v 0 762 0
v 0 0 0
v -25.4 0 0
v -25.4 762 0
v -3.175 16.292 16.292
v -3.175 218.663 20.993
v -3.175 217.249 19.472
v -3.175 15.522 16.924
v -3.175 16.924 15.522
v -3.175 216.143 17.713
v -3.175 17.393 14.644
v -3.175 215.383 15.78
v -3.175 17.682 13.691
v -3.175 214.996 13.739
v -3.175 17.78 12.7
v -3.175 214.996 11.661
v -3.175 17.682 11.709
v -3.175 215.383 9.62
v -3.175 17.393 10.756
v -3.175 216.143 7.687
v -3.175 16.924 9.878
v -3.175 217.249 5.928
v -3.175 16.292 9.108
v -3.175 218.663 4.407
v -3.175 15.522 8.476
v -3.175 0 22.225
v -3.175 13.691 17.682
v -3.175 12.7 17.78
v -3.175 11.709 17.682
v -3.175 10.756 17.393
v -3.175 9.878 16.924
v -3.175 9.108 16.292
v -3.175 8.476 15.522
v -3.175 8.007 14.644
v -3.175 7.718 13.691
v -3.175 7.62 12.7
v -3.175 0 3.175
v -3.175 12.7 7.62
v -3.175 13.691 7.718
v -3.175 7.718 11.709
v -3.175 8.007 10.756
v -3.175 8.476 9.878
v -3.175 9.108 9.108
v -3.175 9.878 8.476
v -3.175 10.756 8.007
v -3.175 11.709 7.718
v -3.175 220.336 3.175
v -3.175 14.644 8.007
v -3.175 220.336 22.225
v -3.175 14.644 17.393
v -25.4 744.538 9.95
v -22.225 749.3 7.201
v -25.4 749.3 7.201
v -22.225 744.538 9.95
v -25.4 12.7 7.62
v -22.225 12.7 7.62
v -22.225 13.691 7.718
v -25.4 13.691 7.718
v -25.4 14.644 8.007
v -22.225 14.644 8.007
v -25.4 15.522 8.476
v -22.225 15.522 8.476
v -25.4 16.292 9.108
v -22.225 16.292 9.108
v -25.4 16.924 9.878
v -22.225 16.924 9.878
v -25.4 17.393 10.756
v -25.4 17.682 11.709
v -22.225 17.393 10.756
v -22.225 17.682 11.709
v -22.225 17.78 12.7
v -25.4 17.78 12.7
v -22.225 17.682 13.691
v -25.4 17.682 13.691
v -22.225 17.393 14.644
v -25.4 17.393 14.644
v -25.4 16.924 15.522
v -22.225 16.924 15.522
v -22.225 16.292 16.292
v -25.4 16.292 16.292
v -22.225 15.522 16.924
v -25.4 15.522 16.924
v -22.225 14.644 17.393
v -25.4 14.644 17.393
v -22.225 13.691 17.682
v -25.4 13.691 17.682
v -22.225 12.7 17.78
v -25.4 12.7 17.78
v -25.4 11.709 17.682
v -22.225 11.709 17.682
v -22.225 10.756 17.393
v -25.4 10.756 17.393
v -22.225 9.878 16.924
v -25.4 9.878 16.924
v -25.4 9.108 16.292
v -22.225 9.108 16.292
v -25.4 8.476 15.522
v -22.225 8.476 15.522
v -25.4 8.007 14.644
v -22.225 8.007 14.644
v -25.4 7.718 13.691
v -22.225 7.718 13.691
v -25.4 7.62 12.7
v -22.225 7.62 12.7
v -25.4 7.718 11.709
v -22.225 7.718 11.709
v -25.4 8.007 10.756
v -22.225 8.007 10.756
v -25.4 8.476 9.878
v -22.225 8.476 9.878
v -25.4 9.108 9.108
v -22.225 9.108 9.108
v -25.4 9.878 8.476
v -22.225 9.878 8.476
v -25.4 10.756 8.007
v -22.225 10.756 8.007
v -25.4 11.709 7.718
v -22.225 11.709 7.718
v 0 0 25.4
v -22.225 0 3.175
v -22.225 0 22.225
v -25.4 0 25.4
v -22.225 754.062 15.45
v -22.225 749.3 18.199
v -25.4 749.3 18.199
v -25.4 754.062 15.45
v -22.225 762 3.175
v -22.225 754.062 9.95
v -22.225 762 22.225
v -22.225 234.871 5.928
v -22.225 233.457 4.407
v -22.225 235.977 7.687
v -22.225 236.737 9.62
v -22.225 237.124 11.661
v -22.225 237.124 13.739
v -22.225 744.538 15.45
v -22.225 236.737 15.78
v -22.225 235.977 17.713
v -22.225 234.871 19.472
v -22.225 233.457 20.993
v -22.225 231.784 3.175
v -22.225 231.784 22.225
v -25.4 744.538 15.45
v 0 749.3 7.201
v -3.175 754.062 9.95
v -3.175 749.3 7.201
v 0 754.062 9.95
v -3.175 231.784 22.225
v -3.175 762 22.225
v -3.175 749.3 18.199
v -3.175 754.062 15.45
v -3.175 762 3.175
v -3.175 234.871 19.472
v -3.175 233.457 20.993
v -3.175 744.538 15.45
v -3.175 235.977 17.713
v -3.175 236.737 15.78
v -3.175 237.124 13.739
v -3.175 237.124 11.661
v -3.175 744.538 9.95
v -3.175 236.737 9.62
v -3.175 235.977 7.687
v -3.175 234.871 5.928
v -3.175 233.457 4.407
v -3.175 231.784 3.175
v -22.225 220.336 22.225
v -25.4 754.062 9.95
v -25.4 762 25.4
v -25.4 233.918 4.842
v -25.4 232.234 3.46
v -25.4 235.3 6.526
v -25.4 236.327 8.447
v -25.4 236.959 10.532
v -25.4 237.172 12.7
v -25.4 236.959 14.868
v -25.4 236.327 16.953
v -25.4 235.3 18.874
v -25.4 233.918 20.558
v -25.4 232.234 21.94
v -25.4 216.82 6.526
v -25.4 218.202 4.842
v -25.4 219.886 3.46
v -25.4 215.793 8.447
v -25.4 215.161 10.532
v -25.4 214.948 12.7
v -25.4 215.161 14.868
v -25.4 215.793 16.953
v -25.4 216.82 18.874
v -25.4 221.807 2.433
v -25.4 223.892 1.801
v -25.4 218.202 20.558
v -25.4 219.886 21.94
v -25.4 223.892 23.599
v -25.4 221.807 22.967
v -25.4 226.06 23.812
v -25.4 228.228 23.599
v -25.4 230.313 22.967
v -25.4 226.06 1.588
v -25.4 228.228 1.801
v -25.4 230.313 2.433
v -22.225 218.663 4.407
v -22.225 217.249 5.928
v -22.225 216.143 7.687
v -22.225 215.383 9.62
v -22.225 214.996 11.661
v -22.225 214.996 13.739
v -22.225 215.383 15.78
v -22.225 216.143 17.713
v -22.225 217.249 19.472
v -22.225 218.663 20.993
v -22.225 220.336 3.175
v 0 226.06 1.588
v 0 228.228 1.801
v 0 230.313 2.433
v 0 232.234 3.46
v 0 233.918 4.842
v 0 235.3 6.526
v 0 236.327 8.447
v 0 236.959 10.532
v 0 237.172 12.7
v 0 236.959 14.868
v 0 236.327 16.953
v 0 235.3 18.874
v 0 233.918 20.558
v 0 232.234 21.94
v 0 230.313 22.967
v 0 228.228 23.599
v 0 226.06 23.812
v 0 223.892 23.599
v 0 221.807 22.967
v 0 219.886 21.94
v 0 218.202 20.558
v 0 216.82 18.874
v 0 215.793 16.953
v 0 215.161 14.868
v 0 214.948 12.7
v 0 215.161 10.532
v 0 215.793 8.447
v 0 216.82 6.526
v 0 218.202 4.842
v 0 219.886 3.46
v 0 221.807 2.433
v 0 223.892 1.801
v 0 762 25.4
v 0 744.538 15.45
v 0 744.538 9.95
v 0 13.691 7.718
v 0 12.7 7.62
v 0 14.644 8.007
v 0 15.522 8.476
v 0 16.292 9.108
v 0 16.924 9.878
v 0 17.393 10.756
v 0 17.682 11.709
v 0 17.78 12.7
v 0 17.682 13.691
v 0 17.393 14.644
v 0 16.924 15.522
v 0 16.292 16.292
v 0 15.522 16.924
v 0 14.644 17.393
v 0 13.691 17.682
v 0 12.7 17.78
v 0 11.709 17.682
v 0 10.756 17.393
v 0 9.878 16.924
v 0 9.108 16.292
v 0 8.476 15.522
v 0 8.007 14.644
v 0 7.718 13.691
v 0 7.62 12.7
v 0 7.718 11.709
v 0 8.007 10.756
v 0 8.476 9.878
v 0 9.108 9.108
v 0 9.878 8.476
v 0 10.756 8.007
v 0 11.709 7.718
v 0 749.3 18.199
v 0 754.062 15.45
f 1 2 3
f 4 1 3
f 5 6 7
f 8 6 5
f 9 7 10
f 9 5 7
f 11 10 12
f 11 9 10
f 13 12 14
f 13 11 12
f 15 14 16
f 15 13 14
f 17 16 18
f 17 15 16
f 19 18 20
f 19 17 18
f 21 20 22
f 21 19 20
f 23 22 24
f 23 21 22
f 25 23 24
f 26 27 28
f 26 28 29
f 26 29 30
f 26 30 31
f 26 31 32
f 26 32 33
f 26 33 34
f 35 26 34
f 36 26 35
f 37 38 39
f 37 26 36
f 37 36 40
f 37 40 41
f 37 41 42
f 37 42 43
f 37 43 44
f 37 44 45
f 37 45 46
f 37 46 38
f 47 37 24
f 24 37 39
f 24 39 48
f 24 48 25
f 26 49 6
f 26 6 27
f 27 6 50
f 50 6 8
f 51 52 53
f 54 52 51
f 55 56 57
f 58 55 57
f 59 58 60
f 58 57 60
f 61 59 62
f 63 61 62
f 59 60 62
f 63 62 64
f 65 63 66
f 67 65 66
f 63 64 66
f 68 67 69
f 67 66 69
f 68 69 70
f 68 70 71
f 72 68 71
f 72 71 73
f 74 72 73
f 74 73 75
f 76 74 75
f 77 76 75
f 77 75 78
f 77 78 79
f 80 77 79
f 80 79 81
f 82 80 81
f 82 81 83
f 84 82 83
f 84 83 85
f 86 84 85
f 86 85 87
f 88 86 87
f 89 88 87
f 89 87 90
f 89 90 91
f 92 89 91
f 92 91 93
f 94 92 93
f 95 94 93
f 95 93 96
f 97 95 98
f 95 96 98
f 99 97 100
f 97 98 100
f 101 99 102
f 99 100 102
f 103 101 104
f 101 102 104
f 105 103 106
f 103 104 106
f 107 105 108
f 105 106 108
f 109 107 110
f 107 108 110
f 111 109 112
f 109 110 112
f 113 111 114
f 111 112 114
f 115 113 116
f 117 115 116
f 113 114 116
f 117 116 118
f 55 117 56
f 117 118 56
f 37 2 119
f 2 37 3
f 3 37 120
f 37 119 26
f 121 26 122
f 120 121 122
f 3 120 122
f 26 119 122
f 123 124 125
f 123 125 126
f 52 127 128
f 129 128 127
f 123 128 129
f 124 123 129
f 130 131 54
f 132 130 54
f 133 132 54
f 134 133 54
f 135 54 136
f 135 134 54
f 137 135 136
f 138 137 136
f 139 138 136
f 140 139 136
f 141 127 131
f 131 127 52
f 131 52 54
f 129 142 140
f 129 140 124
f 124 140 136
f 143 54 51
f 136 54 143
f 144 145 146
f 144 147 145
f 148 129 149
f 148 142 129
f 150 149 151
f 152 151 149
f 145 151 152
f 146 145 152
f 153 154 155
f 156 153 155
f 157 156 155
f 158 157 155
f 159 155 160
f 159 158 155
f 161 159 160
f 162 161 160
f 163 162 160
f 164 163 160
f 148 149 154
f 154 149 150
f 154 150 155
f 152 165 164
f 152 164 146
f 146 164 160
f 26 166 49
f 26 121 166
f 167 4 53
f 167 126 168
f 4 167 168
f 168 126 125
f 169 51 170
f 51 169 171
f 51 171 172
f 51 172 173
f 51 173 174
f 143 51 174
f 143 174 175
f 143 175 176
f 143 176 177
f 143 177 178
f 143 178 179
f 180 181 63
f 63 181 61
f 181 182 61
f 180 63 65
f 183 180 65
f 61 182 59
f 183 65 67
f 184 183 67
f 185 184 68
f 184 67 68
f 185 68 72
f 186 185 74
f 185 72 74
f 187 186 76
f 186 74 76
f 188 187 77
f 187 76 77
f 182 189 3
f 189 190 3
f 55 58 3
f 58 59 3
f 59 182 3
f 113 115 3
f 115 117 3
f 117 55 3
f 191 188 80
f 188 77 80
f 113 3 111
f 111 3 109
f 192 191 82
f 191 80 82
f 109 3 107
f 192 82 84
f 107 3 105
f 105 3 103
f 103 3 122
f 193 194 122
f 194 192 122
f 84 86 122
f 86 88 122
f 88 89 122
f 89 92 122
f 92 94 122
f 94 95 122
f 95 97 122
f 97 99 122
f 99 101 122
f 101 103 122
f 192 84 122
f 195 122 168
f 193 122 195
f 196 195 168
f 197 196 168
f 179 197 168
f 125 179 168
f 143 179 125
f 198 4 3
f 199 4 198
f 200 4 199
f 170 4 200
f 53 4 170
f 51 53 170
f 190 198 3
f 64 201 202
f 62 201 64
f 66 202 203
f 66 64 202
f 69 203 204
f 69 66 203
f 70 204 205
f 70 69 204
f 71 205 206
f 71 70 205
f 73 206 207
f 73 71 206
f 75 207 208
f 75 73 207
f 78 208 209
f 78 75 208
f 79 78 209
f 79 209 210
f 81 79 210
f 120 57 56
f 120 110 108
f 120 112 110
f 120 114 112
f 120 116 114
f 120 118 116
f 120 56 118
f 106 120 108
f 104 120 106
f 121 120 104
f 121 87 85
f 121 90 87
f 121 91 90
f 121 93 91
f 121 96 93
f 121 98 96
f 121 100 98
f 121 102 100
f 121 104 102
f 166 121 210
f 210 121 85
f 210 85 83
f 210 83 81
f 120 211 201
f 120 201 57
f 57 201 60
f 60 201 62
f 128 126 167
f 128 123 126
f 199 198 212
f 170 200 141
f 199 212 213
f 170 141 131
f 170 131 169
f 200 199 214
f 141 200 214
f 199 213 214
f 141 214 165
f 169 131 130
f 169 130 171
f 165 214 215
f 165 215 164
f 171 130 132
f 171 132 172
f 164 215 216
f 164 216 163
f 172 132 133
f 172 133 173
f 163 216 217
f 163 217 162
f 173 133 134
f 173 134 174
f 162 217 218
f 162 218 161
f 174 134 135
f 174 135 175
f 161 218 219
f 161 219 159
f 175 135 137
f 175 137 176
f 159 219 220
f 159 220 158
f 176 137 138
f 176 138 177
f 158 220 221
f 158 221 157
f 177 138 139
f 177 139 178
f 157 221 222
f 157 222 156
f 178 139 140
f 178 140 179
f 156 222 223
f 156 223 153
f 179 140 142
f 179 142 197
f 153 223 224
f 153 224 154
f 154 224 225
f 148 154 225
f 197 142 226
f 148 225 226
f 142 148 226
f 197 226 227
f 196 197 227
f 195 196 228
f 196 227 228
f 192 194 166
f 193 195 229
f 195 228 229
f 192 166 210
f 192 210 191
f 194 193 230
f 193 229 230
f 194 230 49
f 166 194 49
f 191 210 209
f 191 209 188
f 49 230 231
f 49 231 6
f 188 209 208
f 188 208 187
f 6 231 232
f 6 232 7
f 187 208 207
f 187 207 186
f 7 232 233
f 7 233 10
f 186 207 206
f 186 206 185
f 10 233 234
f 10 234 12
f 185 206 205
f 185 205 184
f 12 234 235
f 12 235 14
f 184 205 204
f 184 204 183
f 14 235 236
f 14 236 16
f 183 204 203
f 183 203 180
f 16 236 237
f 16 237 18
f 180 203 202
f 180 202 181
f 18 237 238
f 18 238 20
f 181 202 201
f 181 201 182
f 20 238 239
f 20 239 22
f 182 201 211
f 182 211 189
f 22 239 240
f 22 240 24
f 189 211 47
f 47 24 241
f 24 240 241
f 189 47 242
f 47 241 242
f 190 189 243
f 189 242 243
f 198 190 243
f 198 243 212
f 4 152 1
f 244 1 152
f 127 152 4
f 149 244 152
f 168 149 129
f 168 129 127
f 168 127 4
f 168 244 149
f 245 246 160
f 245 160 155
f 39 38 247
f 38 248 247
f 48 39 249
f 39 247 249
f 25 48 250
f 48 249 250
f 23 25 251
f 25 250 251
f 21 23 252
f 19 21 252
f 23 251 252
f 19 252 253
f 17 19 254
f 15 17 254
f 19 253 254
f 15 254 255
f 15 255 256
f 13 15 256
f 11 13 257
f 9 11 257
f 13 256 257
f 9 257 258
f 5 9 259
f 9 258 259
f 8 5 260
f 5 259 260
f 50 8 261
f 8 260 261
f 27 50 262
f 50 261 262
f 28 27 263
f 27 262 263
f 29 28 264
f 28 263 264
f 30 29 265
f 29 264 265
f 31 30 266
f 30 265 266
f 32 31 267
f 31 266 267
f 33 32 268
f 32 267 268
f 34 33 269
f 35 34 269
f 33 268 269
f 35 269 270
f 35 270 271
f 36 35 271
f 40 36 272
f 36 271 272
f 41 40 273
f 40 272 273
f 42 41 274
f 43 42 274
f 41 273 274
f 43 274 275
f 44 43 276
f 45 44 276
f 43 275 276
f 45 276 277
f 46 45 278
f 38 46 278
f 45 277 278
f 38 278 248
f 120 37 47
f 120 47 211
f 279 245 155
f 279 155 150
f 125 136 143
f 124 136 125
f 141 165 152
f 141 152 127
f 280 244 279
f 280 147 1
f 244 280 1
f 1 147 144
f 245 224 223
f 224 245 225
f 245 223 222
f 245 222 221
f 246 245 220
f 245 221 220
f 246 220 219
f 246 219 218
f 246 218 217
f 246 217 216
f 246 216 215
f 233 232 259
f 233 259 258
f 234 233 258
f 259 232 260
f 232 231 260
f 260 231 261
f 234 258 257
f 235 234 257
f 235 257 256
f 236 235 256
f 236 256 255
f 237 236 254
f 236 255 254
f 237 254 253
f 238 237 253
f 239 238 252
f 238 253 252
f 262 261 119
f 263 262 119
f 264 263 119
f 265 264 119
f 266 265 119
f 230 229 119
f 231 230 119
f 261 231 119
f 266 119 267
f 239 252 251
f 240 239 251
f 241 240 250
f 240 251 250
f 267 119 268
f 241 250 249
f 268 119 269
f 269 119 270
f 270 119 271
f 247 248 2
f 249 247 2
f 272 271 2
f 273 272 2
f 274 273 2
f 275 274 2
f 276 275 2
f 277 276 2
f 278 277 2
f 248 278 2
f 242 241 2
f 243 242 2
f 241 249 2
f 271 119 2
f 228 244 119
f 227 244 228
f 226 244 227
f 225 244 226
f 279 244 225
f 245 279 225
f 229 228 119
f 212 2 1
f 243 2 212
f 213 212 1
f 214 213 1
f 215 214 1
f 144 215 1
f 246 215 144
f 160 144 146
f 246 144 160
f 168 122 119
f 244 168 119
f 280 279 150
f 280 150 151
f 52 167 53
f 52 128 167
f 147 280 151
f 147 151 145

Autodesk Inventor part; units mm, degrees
ref_plane "YZ Plane" through (0, 0, 0) normal (1, 0, 0) x (0, 1, 0)
ref_plane "XZ Plane" through (0, 0, 0) normal (0, 1, 0) x (-1, 0, 0)
ref_plane "XY Plane" through (0, 0, 0) normal (0, 0, 1) x (1, 0, 0)
sketch "Sketch1" plane through (0, 0, 0) normal (0, 1, 0) x (-1, 0, 0)
  line L0 (0, 0) -> (25.4, 0)
  line L1 (25.4, 0) -> (25.4, 25.4)
  line L2 (25.4, 25.4) -> (0, 25.4)
  line L3 (0, 25.4) -> (0, 0)
  line L4 (3.175, 3.175) -> (22.225, 3.175)
  line L5 (22.225, 3.175) -> (22.225, 22.225)
  line L6 (22.225, 22.225) -> (3.175, 22.225)
  line L7 (3.175, 22.225) -> (3.175, 3.175)
  dimension "d0" = 25.4
  dimension "d1" = 25.4
  dimension "d2" = 3.175
  dimension "d3" = 3.175
  dimension "d4" = 3.175
  dimension "d6" = 3.175
extrude "Extrusion1" add sketch "Sketch1" along normal blind 762
sketch "Sketch3" plane through (0, 0, 25.4) normal (1, 0, 0) x (0, 0, -1)
  circle A0 centre (12.7, 12.7) radius 5.08
  line L0 (25.4, 0) -> (25.4, 762) projected
  line L1 (0, 0) -> (25.4, 0) projected
  dimension "d17" = 10.16
  dimension "d18" = 12.7
  dimension "d19" = 12.7
extrude "Extrusion3" cut sketch "Sketch3" against normal blind 25.4
sketch "Sketch4" plane through (0, 0, 25.4) normal (1, 0, 0) x (0, 0, -1)
  line L0 (0, 0) -> (0, 762) projected
  line L1 (0, 0) -> (25.4, 0) projected
  line L2 (25.4, 0) -> (25.4, 762) projected
  point P0 (12.7, 12.7)
  dimension "d22" = 12.7
  dimension "d23" = 12.7
sketch "Sketch5" plane through (0, 0, 25.4) normal (1, 0, 0) x (0, 0, -1)
  line L0 (15.4496, 744.5375) -> (9.9504, 744.5375)
  line L1 (9.9504, 744.5375) -> (7.2007, 749.3)
  line L2 (7.2007, 749.3) -> (9.9504, 754.0625)
  line L3 (9.9504, 754.0625) -> (15.4496, 754.0625)
  line L4 (15.4496, 754.0625) -> (18.1993, 749.3)
  line L5 (18.1993, 749.3) -> (15.4496, 744.5375)
  line L6 (0, 0) -> (0, 762) projected
  line L7 (0, 762) -> (25.4, 762) projected
  point P0 (25.4, 0)
  point P1 (12.7, 749.3)
  point P2 (12.7, 744.5375)
  dimension "d29" = 9.525
  dimension "d30" = 12.7
  dimension "d31" = 12.7
extrude "Extrusion5" cut sketch "Sketch5" against normal blind 25.4
extrude "Extrusion7" [suppressed]
sketch "Sketch6" plane through (0, 0, 25.4) normal (1, 0, 0) x (0, 0, -1)
  circle A0 centre (12.7, 226.06) radius 11.1125
  line L0 (25.4, 0) -> (25.4, 762) projected
  line L1 (0, 0) -> (25.4, 0) projected
  dimension "d40" = 22.225
  dimension "d41" = 12.7
  dimension "d42" = 226.06
extrude "Extrusion8" cut sketch "Sketch6" against normal blind 25.4
equation "\"d4\" = d2"
properties part number "1x1 8th Inch Aluminum Tube Custom Lift Arms"
